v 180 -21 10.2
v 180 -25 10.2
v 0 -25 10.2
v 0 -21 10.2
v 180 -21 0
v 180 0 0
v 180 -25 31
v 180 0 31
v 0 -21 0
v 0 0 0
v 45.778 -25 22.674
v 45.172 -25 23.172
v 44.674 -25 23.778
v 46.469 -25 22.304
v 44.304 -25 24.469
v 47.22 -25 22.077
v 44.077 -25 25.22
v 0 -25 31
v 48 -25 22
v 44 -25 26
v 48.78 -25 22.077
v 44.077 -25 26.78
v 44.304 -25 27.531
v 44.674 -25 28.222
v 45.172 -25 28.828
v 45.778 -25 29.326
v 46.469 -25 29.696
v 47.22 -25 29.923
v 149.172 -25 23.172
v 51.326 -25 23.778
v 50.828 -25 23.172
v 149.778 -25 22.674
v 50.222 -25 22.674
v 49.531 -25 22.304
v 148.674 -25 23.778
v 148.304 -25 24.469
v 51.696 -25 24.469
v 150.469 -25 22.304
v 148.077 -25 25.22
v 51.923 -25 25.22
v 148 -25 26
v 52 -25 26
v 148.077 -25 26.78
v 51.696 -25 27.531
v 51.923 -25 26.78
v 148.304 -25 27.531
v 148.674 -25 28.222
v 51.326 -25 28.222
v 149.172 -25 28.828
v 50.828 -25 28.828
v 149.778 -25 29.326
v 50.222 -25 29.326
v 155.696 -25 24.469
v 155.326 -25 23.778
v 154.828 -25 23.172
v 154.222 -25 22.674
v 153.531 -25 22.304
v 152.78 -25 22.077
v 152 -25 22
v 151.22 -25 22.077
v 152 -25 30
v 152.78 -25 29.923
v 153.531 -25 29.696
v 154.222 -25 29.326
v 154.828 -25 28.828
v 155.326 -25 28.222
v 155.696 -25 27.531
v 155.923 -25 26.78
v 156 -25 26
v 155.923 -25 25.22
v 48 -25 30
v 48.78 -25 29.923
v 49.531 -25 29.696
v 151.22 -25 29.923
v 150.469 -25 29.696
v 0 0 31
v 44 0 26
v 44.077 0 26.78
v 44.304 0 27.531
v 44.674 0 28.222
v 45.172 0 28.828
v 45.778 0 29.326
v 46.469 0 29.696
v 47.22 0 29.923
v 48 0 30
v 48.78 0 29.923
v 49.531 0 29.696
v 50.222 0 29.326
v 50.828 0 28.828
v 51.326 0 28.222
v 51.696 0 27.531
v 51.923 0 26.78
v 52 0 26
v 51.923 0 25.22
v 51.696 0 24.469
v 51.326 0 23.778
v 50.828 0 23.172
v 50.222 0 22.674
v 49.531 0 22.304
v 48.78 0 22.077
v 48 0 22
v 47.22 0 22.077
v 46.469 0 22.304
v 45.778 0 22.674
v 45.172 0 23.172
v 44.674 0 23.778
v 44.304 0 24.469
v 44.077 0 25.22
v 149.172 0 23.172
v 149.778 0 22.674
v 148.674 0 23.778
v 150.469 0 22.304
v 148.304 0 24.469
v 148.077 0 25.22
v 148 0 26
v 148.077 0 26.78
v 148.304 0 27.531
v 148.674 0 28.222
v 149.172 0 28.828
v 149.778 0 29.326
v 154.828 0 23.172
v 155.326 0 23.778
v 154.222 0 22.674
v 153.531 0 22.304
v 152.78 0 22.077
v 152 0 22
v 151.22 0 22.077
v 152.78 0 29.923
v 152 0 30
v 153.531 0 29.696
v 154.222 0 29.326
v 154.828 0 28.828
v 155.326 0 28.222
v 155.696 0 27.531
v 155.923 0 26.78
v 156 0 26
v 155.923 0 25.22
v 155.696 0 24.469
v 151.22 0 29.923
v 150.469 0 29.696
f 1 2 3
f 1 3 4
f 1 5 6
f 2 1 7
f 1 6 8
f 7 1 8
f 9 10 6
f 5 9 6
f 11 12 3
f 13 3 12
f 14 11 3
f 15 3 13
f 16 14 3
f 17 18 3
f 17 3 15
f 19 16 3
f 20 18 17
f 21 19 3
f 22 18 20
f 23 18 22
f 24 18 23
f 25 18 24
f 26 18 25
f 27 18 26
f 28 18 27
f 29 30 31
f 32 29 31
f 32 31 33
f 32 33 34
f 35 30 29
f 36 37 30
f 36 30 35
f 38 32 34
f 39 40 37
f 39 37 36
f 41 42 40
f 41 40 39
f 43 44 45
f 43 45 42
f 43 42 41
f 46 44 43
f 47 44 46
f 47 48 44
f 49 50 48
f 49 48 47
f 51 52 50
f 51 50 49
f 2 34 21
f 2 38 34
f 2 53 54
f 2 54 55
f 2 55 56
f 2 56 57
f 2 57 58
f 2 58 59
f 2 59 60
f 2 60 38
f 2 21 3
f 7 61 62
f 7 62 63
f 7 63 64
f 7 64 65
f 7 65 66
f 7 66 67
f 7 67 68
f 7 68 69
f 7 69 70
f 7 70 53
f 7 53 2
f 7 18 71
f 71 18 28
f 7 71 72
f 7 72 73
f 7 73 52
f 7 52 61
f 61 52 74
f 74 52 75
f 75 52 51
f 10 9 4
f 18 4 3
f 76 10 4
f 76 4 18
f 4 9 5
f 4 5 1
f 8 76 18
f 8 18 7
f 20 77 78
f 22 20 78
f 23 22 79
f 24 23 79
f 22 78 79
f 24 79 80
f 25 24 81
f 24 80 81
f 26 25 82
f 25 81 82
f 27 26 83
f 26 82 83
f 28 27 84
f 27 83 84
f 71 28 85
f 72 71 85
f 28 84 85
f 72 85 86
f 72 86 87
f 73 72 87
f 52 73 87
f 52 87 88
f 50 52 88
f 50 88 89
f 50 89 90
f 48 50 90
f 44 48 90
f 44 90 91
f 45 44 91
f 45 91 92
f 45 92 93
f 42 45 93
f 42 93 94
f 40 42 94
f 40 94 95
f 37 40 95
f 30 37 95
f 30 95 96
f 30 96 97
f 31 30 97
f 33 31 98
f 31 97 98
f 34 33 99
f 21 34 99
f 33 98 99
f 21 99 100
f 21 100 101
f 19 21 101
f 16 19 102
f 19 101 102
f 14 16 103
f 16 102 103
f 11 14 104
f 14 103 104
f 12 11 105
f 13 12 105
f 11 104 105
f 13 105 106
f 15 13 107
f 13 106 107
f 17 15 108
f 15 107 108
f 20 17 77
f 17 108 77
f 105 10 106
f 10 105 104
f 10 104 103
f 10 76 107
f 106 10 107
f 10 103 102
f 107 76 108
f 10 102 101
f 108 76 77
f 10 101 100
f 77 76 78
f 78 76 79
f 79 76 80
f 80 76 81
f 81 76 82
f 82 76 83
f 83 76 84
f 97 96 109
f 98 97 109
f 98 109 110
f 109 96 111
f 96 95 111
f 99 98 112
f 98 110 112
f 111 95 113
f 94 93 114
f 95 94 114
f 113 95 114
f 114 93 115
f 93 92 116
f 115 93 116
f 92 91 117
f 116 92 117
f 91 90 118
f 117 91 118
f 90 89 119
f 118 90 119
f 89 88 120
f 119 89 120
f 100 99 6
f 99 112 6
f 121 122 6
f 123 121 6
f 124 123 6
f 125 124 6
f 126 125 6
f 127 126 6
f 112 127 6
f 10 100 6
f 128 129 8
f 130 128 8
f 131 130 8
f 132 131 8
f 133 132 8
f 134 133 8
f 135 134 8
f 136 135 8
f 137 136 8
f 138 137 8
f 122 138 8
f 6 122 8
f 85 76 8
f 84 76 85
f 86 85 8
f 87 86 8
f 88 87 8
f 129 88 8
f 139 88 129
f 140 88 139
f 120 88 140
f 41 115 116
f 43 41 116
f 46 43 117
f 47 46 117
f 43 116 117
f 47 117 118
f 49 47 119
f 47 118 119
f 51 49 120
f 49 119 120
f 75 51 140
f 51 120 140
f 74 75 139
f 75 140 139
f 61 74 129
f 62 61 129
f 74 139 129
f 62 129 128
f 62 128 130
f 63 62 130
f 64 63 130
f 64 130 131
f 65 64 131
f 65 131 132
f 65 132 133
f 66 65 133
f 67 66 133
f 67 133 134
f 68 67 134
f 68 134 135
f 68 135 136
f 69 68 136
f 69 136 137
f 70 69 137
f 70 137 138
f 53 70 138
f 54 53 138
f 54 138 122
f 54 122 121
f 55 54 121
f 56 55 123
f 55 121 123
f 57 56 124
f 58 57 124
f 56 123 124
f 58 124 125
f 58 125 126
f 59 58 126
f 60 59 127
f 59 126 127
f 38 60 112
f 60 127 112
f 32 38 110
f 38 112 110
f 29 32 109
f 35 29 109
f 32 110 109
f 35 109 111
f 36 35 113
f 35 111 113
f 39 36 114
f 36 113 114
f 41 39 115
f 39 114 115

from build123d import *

# Parameters (mm, degrees)
F0_W     = 180
F0_H     = 31
F1_DEPTH = 25
F2_R     = 4
F3_DEPTH = 25.001
F4_W     = 4
F4_H     = 10.2
F5_DEPTH = 180.001


with BuildPart() as f1:
    # F0 (on Front) → F1 (new body)
    with BuildSketch(Plane.XZ):
        with Locations((90, 15.5)):
            Rectangle(F0_W, F0_H)
    extrude(amount=F1_DEPTH)

    # F2 (on face) → F3 (cut, through all)
    with BuildSketch(Plane(origin=(0, 0, 0), x_dir=(-1, 0, 0), z_dir=(0, 1, 0))):
        with Locations((-152, 26)):
            Circle(F2_R)
        with Locations((-48, 26)):
            Circle(F2_R)
    extrude(amount=-F3_DEPTH, mode=Mode.SUBTRACT)

    # F4 (on face) → F5 (cut, through all)
    with BuildSketch(Plane.YZ.offset(180)):
        with Locations((-23, 5.1)):
            Rectangle(F4_W, F4_H)
    extrude(amount=-F5_DEPTH, mode=Mode.SUBTRACT)


solid = f1.part
